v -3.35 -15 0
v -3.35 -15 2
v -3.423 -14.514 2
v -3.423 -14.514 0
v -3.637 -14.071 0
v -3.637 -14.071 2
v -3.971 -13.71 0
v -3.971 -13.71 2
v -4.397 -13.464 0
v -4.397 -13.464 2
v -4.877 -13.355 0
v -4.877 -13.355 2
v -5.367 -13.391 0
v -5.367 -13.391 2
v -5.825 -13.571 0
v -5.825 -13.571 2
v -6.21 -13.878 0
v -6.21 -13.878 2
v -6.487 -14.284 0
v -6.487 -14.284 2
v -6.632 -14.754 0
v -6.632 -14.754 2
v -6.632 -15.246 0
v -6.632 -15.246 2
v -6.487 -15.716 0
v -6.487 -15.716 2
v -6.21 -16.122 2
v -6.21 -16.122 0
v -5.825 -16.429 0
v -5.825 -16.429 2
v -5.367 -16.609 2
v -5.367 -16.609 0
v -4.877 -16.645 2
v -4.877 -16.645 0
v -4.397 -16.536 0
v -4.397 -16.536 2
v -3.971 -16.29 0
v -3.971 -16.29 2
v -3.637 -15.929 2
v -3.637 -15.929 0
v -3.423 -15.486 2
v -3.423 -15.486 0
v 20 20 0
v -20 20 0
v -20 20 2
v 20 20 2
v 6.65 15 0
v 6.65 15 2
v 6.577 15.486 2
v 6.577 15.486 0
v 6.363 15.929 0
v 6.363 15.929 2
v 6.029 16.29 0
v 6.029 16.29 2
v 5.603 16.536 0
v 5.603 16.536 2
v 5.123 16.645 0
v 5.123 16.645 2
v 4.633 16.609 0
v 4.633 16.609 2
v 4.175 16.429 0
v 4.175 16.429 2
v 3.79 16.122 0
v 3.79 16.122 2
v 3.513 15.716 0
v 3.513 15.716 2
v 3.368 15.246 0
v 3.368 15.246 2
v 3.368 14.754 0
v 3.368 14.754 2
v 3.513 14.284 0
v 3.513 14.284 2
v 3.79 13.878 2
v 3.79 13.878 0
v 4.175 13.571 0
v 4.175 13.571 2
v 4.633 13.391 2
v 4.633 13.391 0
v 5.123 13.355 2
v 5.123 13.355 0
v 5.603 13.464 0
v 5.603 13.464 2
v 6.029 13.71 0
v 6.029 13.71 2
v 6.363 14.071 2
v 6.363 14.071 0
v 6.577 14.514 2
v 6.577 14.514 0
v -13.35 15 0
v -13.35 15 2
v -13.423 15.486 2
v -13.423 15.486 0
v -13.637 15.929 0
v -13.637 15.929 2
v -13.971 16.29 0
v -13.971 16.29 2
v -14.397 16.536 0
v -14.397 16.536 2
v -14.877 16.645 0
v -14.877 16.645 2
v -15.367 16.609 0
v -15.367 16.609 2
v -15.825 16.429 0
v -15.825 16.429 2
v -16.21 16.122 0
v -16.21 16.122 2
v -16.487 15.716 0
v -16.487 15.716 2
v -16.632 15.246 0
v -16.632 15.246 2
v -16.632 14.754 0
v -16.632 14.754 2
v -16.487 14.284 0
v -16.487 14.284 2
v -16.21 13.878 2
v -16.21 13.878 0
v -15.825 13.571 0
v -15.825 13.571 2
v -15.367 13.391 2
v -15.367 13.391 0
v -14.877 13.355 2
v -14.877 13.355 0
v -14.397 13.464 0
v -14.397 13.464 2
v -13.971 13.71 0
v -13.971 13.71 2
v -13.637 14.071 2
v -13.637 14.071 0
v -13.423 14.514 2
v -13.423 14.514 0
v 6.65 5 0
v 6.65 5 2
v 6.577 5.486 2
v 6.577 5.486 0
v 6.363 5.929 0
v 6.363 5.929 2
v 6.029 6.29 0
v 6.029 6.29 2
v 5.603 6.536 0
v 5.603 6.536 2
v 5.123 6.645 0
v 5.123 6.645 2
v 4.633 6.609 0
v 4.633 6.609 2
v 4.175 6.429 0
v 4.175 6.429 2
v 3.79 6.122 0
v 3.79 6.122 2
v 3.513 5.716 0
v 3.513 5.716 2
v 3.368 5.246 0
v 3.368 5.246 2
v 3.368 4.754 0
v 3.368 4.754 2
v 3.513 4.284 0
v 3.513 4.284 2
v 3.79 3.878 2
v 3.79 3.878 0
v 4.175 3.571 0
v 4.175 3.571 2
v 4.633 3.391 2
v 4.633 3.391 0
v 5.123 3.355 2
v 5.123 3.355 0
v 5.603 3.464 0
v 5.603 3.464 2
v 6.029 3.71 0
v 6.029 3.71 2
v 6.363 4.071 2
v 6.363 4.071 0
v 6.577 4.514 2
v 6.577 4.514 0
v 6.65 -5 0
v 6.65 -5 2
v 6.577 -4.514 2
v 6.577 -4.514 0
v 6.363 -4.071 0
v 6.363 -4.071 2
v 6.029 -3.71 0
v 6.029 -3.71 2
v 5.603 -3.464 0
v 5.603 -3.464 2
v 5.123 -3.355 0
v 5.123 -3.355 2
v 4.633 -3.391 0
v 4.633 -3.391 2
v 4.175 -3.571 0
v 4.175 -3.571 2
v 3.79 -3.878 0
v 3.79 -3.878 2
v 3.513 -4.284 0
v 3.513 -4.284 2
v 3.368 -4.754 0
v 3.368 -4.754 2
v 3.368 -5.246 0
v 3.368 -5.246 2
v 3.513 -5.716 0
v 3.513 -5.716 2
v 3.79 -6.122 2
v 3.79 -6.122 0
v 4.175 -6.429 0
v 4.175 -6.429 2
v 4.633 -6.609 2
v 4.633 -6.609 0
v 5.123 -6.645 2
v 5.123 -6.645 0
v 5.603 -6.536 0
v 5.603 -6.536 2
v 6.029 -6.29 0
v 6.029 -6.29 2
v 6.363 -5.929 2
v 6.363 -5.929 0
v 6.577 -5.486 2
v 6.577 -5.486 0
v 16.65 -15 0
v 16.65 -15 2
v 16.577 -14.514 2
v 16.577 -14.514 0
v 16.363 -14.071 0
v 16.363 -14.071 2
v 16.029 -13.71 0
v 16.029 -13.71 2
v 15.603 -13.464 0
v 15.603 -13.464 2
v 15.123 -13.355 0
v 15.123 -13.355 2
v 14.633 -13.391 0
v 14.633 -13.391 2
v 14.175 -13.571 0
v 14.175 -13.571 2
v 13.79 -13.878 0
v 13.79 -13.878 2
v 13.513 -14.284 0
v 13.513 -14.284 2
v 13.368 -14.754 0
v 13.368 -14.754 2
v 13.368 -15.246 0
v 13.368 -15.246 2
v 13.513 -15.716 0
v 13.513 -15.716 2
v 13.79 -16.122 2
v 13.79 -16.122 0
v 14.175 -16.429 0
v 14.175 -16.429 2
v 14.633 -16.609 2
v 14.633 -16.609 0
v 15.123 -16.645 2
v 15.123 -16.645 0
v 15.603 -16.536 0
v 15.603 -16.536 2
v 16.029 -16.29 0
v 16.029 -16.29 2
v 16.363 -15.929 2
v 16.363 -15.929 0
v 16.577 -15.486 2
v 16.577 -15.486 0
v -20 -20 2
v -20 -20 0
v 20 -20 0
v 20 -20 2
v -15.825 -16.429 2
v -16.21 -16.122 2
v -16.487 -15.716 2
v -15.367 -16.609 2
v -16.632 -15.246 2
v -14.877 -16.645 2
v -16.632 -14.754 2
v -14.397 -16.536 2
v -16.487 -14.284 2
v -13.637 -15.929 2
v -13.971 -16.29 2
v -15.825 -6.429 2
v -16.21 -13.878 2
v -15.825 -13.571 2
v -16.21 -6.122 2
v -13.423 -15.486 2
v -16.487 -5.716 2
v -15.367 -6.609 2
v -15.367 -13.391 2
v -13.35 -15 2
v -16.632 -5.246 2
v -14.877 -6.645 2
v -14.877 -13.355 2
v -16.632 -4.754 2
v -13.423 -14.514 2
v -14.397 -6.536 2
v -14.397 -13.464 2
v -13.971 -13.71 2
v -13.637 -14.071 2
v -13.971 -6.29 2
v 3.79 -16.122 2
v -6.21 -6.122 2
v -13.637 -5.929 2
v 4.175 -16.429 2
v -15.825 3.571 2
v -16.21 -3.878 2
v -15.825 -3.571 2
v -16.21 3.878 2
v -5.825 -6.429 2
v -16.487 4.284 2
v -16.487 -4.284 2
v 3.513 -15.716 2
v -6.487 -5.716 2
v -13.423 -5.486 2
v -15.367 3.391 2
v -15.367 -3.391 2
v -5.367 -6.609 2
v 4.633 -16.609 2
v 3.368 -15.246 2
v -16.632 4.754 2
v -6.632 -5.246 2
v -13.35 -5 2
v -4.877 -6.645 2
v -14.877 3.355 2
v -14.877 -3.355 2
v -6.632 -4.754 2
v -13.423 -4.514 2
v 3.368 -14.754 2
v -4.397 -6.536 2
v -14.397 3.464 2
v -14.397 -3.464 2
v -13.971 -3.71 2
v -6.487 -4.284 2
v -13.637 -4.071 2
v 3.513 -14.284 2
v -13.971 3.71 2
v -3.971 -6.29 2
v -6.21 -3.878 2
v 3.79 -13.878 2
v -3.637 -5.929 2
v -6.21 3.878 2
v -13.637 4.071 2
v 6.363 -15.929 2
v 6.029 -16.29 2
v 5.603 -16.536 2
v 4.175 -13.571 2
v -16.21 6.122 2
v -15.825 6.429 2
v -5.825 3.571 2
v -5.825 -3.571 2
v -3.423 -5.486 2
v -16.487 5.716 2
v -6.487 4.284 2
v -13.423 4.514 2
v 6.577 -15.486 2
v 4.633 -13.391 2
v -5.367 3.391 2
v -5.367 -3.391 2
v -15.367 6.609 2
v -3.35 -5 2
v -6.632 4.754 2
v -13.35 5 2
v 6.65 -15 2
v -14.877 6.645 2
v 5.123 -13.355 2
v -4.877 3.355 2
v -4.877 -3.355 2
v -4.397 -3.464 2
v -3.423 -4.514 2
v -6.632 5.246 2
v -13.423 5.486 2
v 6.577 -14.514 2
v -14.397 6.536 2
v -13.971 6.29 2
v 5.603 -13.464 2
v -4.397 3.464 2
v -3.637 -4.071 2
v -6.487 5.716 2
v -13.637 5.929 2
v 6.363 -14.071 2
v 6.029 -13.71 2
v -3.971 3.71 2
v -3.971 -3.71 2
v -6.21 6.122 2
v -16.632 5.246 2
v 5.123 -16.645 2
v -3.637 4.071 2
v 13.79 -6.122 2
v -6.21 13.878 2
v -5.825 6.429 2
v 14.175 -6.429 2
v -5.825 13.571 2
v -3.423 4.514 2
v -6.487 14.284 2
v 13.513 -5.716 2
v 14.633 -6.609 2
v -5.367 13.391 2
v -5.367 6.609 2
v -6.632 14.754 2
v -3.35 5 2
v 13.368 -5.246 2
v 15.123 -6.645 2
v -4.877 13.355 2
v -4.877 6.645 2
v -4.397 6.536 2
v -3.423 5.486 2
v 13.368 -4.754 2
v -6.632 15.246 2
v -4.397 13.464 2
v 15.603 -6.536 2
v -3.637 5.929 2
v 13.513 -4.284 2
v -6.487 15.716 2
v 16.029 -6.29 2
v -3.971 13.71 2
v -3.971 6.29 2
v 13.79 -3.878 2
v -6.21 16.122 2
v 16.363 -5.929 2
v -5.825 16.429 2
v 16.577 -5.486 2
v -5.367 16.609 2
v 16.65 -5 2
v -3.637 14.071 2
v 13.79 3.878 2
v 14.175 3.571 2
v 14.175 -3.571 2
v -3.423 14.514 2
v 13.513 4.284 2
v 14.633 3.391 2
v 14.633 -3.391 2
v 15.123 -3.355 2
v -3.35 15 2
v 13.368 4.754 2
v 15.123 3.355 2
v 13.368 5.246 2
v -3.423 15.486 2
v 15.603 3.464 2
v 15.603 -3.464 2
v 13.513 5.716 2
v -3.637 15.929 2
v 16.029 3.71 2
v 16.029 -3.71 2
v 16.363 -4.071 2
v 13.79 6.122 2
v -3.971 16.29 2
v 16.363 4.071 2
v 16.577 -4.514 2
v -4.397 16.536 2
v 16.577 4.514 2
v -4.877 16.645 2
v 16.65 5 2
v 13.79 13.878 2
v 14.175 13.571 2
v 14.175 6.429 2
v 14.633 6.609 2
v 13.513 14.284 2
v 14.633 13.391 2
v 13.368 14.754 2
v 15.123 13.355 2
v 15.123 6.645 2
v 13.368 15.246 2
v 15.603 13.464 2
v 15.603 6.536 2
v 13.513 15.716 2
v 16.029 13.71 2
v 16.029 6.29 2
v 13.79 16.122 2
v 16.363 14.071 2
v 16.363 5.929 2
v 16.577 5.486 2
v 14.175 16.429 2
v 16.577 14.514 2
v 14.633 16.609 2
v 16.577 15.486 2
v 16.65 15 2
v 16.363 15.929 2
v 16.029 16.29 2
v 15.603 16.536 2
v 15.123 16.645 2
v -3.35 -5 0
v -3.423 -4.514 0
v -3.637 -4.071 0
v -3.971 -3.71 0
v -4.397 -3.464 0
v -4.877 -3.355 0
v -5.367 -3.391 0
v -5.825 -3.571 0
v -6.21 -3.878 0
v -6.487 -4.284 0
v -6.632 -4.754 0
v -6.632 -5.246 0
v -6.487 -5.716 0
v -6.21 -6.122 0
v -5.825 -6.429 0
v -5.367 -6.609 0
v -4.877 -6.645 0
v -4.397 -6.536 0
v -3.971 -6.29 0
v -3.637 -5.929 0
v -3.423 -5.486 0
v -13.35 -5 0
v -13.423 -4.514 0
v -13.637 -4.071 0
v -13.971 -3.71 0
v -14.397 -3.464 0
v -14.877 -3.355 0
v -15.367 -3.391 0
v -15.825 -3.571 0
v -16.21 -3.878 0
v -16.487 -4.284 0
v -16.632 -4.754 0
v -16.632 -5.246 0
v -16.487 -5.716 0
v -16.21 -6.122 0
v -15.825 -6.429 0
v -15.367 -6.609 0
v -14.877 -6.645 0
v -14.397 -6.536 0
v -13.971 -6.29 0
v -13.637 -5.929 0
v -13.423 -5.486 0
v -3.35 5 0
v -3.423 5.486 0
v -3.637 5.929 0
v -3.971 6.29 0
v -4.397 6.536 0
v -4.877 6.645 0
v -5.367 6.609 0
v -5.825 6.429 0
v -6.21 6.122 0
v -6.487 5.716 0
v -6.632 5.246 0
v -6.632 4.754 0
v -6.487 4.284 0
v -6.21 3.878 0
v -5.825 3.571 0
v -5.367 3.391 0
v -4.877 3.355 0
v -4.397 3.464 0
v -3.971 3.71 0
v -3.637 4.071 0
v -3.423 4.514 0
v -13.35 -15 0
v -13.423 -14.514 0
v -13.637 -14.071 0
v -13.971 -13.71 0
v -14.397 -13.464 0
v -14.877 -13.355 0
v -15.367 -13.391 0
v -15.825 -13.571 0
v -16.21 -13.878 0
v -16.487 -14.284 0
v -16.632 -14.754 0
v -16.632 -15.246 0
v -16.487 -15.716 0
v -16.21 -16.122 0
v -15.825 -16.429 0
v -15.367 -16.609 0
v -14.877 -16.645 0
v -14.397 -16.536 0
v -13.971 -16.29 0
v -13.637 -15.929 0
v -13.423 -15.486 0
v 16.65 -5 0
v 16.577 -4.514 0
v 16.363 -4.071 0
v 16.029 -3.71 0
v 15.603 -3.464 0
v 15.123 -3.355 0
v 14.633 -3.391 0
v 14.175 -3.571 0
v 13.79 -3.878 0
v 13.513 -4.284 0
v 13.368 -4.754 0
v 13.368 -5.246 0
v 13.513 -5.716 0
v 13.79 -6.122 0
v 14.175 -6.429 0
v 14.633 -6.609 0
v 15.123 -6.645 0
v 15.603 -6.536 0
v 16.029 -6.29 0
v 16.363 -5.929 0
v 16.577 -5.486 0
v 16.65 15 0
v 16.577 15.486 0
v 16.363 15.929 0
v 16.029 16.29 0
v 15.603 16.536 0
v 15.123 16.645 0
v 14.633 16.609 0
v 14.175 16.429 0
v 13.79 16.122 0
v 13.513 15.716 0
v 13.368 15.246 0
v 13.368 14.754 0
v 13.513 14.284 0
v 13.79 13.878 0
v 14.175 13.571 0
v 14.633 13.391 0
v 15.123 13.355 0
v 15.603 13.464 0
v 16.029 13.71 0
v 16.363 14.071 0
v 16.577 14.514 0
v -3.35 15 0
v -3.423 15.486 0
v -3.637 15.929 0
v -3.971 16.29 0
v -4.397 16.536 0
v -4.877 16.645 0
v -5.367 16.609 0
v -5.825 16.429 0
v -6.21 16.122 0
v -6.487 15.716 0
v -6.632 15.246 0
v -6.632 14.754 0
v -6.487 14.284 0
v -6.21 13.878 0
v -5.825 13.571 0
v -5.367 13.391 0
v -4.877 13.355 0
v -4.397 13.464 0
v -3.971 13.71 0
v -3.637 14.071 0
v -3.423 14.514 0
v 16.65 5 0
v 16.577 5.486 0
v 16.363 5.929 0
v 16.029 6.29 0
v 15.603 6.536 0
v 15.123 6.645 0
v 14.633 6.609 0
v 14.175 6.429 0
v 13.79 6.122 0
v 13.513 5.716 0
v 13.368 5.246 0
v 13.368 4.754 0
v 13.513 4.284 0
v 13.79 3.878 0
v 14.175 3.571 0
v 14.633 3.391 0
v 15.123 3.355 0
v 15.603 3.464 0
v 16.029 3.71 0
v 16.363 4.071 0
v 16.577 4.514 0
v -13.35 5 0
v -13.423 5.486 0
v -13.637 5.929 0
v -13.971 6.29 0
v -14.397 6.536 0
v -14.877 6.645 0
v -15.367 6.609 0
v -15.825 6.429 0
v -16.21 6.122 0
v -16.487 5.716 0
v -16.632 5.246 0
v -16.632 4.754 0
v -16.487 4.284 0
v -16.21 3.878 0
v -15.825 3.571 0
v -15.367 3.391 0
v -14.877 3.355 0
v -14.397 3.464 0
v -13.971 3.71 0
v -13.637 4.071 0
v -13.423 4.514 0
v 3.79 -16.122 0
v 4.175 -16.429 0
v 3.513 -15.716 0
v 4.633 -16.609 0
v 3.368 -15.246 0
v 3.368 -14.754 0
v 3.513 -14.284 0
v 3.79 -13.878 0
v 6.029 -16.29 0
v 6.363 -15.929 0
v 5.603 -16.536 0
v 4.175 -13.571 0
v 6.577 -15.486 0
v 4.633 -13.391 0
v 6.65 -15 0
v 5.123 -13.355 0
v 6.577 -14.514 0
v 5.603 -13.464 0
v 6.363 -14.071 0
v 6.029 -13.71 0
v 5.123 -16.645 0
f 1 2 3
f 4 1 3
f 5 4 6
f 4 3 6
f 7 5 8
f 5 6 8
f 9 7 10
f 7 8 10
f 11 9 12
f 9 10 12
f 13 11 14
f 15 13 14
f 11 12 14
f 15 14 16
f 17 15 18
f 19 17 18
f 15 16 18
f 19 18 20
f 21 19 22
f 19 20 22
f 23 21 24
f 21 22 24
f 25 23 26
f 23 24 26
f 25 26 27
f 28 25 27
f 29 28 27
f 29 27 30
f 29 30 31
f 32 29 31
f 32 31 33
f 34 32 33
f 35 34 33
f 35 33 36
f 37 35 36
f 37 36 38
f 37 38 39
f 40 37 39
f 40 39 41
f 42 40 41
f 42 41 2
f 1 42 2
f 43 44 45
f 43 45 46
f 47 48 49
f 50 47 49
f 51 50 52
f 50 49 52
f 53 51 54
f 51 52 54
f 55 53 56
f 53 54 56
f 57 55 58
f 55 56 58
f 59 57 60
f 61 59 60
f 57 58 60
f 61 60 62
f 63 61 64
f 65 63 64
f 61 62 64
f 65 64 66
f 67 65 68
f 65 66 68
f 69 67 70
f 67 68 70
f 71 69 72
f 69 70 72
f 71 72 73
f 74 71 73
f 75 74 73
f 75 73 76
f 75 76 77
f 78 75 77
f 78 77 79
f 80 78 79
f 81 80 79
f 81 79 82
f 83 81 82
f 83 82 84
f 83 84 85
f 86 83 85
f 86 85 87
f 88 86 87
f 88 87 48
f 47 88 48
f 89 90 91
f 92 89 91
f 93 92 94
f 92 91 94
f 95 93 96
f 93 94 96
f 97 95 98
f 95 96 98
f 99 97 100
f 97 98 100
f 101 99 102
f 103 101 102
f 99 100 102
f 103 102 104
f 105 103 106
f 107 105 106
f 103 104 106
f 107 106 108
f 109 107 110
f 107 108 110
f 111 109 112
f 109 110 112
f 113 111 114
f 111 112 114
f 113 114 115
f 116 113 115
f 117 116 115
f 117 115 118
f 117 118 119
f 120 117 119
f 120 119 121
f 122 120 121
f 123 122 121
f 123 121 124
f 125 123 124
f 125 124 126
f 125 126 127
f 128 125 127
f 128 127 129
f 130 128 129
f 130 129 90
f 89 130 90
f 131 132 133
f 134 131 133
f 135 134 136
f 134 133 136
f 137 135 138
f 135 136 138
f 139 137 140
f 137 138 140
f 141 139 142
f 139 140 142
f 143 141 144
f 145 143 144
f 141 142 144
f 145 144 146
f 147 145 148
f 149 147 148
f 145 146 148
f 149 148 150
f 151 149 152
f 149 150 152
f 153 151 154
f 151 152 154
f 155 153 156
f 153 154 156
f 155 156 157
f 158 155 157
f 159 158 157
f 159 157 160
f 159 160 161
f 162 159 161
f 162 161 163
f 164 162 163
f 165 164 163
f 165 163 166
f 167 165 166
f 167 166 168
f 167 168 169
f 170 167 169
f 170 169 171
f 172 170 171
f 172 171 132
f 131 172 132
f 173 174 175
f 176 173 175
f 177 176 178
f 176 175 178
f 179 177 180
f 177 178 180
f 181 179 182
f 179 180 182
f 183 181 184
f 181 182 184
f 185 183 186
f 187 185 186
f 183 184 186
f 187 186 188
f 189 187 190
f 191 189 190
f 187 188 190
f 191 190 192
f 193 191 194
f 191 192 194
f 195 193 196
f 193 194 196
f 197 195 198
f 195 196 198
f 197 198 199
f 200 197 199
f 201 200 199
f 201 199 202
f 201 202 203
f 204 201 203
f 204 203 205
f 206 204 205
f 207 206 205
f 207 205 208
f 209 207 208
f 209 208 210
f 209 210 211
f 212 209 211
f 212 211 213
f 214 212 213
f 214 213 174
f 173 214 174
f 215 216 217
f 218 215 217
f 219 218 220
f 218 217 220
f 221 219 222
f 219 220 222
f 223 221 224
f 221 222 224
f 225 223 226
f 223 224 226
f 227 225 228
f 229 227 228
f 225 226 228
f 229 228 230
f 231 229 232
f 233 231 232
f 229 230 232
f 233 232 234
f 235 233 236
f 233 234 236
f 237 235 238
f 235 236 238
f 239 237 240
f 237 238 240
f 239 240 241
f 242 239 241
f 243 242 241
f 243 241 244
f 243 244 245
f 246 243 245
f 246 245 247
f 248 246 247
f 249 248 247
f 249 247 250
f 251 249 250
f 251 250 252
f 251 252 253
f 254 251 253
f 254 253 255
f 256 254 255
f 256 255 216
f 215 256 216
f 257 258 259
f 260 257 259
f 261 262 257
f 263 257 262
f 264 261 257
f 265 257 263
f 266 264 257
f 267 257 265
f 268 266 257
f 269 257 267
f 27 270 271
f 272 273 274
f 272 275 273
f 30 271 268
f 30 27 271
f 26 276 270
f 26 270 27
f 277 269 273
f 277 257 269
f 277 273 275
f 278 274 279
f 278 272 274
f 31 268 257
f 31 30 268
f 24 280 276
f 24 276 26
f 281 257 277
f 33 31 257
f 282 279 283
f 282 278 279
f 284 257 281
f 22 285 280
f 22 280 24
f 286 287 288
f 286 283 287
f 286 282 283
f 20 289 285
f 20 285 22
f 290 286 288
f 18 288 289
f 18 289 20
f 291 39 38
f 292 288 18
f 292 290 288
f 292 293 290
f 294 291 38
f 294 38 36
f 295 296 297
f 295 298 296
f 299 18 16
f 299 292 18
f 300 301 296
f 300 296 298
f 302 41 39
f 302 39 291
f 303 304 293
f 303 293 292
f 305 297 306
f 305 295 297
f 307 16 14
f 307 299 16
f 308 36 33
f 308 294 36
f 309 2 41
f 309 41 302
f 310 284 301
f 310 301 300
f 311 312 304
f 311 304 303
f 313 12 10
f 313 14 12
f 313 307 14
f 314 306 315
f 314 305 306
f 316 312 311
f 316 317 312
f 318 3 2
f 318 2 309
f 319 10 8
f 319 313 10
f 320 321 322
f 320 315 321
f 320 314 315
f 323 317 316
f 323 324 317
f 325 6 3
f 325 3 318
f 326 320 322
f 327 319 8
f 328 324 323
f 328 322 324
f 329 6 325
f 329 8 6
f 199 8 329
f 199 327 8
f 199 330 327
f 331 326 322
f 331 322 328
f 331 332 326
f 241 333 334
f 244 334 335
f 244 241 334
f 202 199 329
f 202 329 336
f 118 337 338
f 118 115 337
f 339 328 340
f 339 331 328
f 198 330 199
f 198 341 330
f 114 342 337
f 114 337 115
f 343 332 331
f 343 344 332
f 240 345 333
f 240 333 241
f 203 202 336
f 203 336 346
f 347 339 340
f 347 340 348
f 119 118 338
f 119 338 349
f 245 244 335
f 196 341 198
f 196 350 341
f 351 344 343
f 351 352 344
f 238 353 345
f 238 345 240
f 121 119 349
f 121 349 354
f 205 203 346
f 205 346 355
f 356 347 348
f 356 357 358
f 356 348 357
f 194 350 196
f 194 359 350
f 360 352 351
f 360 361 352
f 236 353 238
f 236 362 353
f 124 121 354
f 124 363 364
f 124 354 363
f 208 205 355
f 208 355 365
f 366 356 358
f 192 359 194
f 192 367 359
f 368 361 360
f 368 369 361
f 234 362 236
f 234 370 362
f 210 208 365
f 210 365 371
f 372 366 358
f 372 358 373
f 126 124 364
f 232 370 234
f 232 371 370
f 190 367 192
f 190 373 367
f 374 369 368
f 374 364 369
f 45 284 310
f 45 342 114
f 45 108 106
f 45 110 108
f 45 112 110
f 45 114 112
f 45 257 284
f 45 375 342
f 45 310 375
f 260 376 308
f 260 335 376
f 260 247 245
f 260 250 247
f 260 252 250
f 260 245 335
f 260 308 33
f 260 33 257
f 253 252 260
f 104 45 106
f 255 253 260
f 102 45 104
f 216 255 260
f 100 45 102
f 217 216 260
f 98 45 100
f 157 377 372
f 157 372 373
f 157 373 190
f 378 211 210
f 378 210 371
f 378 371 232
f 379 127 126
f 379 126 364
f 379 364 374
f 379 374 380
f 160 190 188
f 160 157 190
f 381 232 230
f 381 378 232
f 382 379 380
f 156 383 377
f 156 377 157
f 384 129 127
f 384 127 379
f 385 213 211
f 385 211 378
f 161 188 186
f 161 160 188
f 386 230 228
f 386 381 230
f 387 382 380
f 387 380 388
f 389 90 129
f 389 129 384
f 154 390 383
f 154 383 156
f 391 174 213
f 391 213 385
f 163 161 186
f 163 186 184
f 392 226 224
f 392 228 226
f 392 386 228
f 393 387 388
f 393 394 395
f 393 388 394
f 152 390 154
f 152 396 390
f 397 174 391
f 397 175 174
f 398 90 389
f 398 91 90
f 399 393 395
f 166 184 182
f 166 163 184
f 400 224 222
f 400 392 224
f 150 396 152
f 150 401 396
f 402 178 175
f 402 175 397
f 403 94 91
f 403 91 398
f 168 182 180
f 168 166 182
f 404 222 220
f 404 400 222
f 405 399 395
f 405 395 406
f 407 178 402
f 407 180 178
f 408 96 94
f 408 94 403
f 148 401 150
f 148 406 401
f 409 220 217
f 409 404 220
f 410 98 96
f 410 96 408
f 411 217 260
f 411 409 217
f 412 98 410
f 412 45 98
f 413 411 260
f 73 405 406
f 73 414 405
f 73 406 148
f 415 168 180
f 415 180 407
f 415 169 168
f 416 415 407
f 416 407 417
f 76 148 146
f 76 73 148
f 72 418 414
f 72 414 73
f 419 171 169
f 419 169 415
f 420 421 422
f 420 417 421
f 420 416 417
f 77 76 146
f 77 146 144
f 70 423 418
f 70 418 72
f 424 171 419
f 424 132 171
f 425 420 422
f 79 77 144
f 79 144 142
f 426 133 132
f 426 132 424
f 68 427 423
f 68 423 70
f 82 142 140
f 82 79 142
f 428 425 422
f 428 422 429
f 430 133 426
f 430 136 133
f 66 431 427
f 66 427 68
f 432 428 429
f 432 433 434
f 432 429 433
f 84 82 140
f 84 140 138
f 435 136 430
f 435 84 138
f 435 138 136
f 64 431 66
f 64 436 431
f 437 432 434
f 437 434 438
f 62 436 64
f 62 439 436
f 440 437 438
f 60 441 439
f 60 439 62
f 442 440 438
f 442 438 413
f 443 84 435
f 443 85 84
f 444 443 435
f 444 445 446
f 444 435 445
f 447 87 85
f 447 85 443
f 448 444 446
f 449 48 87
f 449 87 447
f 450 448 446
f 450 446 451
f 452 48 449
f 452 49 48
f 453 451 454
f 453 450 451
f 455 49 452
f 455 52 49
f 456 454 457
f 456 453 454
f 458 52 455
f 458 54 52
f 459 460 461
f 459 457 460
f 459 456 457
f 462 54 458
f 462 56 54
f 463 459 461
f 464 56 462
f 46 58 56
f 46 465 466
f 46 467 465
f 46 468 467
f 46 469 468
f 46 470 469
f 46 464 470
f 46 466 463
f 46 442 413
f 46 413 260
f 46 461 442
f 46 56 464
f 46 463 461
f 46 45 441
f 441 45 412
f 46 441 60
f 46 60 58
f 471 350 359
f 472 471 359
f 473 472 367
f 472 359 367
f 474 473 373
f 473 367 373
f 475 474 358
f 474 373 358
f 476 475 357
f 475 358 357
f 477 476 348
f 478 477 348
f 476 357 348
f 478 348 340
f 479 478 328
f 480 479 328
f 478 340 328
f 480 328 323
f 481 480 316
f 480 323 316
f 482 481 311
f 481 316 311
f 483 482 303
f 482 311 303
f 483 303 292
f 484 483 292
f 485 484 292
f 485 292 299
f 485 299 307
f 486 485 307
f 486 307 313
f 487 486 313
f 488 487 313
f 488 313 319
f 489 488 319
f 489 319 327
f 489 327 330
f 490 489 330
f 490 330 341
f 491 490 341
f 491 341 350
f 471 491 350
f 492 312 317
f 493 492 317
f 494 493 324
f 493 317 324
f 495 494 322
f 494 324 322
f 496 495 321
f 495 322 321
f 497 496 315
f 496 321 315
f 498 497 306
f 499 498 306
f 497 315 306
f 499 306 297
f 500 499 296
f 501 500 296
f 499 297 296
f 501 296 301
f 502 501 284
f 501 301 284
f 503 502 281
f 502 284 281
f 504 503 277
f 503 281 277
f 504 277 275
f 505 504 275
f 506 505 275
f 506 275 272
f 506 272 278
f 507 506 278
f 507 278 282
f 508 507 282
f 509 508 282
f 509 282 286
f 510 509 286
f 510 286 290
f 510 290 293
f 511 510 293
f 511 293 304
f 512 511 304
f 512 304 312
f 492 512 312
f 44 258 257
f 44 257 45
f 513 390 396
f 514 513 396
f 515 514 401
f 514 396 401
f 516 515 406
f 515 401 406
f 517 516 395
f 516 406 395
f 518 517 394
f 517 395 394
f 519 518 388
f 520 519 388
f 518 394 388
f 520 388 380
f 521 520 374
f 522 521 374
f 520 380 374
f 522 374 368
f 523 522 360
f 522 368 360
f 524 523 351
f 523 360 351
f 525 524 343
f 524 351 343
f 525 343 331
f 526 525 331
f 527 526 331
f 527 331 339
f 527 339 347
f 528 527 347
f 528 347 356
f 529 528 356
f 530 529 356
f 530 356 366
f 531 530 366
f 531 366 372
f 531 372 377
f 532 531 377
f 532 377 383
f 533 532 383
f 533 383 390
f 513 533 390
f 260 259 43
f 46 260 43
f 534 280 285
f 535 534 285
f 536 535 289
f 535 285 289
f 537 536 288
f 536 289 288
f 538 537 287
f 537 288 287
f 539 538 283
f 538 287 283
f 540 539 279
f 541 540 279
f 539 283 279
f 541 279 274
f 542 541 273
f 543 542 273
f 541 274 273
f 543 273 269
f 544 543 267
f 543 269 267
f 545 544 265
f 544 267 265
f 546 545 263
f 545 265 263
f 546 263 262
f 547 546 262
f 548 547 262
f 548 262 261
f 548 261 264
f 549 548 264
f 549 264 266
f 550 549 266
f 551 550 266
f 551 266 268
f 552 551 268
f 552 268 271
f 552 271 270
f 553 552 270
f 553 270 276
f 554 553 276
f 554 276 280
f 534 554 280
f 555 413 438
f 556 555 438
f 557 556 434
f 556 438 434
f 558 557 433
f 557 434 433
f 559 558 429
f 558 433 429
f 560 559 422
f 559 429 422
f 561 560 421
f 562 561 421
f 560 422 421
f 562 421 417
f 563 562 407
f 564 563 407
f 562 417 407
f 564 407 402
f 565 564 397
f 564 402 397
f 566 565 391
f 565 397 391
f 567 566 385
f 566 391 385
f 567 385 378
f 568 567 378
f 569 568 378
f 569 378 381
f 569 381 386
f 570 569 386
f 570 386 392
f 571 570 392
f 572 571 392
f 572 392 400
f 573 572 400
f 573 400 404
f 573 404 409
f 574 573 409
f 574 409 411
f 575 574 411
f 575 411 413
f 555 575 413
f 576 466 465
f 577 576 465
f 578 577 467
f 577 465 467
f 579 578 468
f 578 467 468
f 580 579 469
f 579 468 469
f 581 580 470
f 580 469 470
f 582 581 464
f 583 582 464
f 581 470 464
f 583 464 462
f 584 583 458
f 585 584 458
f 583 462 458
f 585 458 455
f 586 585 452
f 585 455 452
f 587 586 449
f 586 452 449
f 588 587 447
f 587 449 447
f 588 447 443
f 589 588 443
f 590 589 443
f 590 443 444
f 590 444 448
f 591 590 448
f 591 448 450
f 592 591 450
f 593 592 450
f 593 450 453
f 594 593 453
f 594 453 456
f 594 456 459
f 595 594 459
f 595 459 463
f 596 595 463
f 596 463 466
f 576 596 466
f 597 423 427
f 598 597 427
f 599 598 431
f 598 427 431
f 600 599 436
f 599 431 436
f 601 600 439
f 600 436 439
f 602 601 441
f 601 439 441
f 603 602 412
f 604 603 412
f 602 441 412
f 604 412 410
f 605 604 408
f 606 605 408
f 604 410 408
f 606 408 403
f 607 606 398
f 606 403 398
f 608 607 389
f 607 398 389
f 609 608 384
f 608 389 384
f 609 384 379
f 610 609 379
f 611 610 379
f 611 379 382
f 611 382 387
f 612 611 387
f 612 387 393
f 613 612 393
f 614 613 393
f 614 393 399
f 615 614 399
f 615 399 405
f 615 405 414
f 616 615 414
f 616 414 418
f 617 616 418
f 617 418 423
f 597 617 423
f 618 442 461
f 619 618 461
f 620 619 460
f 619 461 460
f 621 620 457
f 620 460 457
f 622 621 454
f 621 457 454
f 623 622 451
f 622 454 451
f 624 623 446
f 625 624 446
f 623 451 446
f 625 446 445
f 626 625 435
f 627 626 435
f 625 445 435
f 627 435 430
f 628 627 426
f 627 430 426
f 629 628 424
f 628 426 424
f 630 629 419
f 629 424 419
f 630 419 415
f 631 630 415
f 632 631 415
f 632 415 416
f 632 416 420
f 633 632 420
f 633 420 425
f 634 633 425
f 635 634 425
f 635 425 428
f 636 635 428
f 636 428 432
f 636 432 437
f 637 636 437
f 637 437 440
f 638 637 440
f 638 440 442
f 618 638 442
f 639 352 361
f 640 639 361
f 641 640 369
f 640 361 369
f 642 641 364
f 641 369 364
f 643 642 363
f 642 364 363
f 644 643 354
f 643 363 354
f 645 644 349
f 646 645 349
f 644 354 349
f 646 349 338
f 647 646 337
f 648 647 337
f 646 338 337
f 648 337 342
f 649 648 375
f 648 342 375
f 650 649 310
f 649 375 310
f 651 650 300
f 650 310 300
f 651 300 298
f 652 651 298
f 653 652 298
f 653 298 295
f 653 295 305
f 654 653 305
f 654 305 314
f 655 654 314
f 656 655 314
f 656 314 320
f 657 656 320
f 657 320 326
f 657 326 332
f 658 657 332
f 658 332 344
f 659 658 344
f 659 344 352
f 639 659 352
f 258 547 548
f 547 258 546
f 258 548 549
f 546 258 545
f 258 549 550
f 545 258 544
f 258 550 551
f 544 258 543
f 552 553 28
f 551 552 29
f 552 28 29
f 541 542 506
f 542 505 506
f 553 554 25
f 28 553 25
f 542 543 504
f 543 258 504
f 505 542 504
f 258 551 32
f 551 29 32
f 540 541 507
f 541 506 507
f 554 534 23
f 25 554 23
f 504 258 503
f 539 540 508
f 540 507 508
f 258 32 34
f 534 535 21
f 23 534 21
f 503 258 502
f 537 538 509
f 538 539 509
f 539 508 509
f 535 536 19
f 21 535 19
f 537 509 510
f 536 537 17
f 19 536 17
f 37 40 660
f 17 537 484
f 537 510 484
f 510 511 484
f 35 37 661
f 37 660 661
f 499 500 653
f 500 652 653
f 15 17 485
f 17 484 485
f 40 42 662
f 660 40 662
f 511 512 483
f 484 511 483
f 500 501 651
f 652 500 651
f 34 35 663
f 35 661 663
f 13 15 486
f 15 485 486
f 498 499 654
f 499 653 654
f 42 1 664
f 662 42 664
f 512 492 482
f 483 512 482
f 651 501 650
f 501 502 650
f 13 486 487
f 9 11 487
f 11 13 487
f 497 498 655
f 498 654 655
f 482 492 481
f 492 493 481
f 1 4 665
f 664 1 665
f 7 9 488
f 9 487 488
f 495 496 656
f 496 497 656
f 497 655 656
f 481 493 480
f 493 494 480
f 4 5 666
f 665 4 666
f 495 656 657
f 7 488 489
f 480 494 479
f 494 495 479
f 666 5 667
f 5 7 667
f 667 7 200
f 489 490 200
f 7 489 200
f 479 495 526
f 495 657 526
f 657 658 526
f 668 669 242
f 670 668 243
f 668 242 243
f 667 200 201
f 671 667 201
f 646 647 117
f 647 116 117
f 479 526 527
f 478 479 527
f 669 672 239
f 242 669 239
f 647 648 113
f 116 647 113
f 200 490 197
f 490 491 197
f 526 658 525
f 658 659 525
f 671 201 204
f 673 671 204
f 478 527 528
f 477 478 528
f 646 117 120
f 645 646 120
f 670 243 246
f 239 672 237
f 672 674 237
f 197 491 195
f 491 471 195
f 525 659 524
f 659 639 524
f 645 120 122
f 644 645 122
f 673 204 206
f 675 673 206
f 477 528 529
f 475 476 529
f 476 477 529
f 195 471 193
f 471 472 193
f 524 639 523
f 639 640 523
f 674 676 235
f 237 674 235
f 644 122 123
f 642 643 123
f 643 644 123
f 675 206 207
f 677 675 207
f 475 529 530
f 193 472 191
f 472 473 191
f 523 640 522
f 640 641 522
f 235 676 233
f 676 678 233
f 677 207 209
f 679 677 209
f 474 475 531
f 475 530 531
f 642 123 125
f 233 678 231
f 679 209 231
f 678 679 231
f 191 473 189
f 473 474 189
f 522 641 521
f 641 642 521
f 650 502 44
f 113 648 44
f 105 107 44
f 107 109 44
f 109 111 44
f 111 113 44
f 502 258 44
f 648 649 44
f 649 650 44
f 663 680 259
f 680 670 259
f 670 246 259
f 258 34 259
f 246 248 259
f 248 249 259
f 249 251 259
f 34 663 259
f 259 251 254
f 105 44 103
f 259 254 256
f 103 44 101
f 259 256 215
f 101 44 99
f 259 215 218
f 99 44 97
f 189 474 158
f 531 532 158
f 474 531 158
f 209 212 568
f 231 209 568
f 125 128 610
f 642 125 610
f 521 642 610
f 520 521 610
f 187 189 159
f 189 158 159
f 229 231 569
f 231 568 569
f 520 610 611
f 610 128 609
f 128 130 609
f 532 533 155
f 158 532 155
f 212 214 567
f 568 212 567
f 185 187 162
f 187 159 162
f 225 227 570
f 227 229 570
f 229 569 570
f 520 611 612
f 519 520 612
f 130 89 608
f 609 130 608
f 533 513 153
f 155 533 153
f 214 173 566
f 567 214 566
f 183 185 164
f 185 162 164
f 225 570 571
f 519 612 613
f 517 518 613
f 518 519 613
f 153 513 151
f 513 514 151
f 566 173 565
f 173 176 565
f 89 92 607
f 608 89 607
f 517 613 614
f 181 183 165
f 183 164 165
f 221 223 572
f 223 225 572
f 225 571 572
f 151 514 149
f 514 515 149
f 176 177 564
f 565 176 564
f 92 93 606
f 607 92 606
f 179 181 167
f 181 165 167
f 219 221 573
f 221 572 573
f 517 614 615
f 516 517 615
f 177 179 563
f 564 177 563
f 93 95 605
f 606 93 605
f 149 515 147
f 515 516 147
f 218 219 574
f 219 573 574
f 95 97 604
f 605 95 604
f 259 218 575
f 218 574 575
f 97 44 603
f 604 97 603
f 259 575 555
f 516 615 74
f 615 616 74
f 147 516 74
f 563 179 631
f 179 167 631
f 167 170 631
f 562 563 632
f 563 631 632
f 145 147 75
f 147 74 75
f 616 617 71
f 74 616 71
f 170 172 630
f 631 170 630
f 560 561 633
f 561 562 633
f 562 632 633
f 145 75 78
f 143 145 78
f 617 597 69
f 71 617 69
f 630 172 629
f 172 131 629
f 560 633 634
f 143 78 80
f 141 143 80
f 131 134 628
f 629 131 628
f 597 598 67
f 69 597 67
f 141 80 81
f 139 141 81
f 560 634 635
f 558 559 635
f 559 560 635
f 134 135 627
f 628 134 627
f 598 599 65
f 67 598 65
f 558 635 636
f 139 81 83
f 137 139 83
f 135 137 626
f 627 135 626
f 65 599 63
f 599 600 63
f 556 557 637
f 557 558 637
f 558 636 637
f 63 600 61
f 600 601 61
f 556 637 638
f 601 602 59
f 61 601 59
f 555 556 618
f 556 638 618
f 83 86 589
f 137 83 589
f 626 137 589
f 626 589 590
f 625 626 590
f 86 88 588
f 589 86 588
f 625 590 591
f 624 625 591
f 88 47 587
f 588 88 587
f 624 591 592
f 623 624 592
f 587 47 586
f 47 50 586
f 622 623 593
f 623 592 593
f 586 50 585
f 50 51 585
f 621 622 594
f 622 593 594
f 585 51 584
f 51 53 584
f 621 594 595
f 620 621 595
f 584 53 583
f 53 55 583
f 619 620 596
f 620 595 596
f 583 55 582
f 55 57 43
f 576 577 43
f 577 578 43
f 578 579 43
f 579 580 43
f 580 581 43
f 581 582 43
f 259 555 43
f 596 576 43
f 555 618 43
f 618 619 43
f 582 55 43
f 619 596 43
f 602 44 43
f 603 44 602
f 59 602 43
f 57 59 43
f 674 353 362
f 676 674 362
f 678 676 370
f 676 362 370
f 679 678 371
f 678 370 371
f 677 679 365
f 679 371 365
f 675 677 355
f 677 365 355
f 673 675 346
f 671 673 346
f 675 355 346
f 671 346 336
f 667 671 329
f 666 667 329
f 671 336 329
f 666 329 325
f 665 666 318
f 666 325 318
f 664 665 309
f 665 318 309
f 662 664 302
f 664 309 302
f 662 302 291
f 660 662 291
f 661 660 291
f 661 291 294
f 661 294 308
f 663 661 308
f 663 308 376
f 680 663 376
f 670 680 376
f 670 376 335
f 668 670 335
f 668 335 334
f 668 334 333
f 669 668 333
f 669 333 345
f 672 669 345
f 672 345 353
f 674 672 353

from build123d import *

# Parameters (mm, degrees)
SKETCH1_W            = 40
SKETCH1_H            = 40
BOSS_EXTRUDE1_DEPTH  = 2
SKETCH2_R            = 1.65
CUT_EXTRUDE1_DEPTH   = 3
LPATTERN1_COUNT      = 4
LPATTERN1_PITCH      = 10
LPATTERN1_COUNT_DIR2 = 4
LPATTERN1_PITCH_DIR2 = 10


with BuildPart() as part:
    # Sketch1 → Boss-Extrude1 (new body)
    with BuildSketch(Plane.XY):
        Rectangle(SKETCH1_W, SKETCH1_H)
    extrude(amount=BOSS_EXTRUDE1_DEPTH)

    # Sketch2 → Cut-Extrude1 (cut, through all)
    with BuildSketch(Plane.XY.offset(2)):
        with Locations((-15, 15)):
            Circle(SKETCH2_R)
    cut_extrude1 = extrude(amount=-CUT_EXTRUDE1_DEPTH, mode=Mode.SUBTRACT)

    # LPattern1: Cut-Extrude1 4 × 4
    with Locations(*[(j * LPATTERN1_PITCH_DIR2, -i * LPATTERN1_PITCH, 0) for i in range(LPATTERN1_COUNT) for j in range(LPATTERN1_COUNT_DIR2) if (i, j) != (0, 0)]):
        add(cut_extrude1, mode=Mode.SUBTRACT)


solid = part.part
